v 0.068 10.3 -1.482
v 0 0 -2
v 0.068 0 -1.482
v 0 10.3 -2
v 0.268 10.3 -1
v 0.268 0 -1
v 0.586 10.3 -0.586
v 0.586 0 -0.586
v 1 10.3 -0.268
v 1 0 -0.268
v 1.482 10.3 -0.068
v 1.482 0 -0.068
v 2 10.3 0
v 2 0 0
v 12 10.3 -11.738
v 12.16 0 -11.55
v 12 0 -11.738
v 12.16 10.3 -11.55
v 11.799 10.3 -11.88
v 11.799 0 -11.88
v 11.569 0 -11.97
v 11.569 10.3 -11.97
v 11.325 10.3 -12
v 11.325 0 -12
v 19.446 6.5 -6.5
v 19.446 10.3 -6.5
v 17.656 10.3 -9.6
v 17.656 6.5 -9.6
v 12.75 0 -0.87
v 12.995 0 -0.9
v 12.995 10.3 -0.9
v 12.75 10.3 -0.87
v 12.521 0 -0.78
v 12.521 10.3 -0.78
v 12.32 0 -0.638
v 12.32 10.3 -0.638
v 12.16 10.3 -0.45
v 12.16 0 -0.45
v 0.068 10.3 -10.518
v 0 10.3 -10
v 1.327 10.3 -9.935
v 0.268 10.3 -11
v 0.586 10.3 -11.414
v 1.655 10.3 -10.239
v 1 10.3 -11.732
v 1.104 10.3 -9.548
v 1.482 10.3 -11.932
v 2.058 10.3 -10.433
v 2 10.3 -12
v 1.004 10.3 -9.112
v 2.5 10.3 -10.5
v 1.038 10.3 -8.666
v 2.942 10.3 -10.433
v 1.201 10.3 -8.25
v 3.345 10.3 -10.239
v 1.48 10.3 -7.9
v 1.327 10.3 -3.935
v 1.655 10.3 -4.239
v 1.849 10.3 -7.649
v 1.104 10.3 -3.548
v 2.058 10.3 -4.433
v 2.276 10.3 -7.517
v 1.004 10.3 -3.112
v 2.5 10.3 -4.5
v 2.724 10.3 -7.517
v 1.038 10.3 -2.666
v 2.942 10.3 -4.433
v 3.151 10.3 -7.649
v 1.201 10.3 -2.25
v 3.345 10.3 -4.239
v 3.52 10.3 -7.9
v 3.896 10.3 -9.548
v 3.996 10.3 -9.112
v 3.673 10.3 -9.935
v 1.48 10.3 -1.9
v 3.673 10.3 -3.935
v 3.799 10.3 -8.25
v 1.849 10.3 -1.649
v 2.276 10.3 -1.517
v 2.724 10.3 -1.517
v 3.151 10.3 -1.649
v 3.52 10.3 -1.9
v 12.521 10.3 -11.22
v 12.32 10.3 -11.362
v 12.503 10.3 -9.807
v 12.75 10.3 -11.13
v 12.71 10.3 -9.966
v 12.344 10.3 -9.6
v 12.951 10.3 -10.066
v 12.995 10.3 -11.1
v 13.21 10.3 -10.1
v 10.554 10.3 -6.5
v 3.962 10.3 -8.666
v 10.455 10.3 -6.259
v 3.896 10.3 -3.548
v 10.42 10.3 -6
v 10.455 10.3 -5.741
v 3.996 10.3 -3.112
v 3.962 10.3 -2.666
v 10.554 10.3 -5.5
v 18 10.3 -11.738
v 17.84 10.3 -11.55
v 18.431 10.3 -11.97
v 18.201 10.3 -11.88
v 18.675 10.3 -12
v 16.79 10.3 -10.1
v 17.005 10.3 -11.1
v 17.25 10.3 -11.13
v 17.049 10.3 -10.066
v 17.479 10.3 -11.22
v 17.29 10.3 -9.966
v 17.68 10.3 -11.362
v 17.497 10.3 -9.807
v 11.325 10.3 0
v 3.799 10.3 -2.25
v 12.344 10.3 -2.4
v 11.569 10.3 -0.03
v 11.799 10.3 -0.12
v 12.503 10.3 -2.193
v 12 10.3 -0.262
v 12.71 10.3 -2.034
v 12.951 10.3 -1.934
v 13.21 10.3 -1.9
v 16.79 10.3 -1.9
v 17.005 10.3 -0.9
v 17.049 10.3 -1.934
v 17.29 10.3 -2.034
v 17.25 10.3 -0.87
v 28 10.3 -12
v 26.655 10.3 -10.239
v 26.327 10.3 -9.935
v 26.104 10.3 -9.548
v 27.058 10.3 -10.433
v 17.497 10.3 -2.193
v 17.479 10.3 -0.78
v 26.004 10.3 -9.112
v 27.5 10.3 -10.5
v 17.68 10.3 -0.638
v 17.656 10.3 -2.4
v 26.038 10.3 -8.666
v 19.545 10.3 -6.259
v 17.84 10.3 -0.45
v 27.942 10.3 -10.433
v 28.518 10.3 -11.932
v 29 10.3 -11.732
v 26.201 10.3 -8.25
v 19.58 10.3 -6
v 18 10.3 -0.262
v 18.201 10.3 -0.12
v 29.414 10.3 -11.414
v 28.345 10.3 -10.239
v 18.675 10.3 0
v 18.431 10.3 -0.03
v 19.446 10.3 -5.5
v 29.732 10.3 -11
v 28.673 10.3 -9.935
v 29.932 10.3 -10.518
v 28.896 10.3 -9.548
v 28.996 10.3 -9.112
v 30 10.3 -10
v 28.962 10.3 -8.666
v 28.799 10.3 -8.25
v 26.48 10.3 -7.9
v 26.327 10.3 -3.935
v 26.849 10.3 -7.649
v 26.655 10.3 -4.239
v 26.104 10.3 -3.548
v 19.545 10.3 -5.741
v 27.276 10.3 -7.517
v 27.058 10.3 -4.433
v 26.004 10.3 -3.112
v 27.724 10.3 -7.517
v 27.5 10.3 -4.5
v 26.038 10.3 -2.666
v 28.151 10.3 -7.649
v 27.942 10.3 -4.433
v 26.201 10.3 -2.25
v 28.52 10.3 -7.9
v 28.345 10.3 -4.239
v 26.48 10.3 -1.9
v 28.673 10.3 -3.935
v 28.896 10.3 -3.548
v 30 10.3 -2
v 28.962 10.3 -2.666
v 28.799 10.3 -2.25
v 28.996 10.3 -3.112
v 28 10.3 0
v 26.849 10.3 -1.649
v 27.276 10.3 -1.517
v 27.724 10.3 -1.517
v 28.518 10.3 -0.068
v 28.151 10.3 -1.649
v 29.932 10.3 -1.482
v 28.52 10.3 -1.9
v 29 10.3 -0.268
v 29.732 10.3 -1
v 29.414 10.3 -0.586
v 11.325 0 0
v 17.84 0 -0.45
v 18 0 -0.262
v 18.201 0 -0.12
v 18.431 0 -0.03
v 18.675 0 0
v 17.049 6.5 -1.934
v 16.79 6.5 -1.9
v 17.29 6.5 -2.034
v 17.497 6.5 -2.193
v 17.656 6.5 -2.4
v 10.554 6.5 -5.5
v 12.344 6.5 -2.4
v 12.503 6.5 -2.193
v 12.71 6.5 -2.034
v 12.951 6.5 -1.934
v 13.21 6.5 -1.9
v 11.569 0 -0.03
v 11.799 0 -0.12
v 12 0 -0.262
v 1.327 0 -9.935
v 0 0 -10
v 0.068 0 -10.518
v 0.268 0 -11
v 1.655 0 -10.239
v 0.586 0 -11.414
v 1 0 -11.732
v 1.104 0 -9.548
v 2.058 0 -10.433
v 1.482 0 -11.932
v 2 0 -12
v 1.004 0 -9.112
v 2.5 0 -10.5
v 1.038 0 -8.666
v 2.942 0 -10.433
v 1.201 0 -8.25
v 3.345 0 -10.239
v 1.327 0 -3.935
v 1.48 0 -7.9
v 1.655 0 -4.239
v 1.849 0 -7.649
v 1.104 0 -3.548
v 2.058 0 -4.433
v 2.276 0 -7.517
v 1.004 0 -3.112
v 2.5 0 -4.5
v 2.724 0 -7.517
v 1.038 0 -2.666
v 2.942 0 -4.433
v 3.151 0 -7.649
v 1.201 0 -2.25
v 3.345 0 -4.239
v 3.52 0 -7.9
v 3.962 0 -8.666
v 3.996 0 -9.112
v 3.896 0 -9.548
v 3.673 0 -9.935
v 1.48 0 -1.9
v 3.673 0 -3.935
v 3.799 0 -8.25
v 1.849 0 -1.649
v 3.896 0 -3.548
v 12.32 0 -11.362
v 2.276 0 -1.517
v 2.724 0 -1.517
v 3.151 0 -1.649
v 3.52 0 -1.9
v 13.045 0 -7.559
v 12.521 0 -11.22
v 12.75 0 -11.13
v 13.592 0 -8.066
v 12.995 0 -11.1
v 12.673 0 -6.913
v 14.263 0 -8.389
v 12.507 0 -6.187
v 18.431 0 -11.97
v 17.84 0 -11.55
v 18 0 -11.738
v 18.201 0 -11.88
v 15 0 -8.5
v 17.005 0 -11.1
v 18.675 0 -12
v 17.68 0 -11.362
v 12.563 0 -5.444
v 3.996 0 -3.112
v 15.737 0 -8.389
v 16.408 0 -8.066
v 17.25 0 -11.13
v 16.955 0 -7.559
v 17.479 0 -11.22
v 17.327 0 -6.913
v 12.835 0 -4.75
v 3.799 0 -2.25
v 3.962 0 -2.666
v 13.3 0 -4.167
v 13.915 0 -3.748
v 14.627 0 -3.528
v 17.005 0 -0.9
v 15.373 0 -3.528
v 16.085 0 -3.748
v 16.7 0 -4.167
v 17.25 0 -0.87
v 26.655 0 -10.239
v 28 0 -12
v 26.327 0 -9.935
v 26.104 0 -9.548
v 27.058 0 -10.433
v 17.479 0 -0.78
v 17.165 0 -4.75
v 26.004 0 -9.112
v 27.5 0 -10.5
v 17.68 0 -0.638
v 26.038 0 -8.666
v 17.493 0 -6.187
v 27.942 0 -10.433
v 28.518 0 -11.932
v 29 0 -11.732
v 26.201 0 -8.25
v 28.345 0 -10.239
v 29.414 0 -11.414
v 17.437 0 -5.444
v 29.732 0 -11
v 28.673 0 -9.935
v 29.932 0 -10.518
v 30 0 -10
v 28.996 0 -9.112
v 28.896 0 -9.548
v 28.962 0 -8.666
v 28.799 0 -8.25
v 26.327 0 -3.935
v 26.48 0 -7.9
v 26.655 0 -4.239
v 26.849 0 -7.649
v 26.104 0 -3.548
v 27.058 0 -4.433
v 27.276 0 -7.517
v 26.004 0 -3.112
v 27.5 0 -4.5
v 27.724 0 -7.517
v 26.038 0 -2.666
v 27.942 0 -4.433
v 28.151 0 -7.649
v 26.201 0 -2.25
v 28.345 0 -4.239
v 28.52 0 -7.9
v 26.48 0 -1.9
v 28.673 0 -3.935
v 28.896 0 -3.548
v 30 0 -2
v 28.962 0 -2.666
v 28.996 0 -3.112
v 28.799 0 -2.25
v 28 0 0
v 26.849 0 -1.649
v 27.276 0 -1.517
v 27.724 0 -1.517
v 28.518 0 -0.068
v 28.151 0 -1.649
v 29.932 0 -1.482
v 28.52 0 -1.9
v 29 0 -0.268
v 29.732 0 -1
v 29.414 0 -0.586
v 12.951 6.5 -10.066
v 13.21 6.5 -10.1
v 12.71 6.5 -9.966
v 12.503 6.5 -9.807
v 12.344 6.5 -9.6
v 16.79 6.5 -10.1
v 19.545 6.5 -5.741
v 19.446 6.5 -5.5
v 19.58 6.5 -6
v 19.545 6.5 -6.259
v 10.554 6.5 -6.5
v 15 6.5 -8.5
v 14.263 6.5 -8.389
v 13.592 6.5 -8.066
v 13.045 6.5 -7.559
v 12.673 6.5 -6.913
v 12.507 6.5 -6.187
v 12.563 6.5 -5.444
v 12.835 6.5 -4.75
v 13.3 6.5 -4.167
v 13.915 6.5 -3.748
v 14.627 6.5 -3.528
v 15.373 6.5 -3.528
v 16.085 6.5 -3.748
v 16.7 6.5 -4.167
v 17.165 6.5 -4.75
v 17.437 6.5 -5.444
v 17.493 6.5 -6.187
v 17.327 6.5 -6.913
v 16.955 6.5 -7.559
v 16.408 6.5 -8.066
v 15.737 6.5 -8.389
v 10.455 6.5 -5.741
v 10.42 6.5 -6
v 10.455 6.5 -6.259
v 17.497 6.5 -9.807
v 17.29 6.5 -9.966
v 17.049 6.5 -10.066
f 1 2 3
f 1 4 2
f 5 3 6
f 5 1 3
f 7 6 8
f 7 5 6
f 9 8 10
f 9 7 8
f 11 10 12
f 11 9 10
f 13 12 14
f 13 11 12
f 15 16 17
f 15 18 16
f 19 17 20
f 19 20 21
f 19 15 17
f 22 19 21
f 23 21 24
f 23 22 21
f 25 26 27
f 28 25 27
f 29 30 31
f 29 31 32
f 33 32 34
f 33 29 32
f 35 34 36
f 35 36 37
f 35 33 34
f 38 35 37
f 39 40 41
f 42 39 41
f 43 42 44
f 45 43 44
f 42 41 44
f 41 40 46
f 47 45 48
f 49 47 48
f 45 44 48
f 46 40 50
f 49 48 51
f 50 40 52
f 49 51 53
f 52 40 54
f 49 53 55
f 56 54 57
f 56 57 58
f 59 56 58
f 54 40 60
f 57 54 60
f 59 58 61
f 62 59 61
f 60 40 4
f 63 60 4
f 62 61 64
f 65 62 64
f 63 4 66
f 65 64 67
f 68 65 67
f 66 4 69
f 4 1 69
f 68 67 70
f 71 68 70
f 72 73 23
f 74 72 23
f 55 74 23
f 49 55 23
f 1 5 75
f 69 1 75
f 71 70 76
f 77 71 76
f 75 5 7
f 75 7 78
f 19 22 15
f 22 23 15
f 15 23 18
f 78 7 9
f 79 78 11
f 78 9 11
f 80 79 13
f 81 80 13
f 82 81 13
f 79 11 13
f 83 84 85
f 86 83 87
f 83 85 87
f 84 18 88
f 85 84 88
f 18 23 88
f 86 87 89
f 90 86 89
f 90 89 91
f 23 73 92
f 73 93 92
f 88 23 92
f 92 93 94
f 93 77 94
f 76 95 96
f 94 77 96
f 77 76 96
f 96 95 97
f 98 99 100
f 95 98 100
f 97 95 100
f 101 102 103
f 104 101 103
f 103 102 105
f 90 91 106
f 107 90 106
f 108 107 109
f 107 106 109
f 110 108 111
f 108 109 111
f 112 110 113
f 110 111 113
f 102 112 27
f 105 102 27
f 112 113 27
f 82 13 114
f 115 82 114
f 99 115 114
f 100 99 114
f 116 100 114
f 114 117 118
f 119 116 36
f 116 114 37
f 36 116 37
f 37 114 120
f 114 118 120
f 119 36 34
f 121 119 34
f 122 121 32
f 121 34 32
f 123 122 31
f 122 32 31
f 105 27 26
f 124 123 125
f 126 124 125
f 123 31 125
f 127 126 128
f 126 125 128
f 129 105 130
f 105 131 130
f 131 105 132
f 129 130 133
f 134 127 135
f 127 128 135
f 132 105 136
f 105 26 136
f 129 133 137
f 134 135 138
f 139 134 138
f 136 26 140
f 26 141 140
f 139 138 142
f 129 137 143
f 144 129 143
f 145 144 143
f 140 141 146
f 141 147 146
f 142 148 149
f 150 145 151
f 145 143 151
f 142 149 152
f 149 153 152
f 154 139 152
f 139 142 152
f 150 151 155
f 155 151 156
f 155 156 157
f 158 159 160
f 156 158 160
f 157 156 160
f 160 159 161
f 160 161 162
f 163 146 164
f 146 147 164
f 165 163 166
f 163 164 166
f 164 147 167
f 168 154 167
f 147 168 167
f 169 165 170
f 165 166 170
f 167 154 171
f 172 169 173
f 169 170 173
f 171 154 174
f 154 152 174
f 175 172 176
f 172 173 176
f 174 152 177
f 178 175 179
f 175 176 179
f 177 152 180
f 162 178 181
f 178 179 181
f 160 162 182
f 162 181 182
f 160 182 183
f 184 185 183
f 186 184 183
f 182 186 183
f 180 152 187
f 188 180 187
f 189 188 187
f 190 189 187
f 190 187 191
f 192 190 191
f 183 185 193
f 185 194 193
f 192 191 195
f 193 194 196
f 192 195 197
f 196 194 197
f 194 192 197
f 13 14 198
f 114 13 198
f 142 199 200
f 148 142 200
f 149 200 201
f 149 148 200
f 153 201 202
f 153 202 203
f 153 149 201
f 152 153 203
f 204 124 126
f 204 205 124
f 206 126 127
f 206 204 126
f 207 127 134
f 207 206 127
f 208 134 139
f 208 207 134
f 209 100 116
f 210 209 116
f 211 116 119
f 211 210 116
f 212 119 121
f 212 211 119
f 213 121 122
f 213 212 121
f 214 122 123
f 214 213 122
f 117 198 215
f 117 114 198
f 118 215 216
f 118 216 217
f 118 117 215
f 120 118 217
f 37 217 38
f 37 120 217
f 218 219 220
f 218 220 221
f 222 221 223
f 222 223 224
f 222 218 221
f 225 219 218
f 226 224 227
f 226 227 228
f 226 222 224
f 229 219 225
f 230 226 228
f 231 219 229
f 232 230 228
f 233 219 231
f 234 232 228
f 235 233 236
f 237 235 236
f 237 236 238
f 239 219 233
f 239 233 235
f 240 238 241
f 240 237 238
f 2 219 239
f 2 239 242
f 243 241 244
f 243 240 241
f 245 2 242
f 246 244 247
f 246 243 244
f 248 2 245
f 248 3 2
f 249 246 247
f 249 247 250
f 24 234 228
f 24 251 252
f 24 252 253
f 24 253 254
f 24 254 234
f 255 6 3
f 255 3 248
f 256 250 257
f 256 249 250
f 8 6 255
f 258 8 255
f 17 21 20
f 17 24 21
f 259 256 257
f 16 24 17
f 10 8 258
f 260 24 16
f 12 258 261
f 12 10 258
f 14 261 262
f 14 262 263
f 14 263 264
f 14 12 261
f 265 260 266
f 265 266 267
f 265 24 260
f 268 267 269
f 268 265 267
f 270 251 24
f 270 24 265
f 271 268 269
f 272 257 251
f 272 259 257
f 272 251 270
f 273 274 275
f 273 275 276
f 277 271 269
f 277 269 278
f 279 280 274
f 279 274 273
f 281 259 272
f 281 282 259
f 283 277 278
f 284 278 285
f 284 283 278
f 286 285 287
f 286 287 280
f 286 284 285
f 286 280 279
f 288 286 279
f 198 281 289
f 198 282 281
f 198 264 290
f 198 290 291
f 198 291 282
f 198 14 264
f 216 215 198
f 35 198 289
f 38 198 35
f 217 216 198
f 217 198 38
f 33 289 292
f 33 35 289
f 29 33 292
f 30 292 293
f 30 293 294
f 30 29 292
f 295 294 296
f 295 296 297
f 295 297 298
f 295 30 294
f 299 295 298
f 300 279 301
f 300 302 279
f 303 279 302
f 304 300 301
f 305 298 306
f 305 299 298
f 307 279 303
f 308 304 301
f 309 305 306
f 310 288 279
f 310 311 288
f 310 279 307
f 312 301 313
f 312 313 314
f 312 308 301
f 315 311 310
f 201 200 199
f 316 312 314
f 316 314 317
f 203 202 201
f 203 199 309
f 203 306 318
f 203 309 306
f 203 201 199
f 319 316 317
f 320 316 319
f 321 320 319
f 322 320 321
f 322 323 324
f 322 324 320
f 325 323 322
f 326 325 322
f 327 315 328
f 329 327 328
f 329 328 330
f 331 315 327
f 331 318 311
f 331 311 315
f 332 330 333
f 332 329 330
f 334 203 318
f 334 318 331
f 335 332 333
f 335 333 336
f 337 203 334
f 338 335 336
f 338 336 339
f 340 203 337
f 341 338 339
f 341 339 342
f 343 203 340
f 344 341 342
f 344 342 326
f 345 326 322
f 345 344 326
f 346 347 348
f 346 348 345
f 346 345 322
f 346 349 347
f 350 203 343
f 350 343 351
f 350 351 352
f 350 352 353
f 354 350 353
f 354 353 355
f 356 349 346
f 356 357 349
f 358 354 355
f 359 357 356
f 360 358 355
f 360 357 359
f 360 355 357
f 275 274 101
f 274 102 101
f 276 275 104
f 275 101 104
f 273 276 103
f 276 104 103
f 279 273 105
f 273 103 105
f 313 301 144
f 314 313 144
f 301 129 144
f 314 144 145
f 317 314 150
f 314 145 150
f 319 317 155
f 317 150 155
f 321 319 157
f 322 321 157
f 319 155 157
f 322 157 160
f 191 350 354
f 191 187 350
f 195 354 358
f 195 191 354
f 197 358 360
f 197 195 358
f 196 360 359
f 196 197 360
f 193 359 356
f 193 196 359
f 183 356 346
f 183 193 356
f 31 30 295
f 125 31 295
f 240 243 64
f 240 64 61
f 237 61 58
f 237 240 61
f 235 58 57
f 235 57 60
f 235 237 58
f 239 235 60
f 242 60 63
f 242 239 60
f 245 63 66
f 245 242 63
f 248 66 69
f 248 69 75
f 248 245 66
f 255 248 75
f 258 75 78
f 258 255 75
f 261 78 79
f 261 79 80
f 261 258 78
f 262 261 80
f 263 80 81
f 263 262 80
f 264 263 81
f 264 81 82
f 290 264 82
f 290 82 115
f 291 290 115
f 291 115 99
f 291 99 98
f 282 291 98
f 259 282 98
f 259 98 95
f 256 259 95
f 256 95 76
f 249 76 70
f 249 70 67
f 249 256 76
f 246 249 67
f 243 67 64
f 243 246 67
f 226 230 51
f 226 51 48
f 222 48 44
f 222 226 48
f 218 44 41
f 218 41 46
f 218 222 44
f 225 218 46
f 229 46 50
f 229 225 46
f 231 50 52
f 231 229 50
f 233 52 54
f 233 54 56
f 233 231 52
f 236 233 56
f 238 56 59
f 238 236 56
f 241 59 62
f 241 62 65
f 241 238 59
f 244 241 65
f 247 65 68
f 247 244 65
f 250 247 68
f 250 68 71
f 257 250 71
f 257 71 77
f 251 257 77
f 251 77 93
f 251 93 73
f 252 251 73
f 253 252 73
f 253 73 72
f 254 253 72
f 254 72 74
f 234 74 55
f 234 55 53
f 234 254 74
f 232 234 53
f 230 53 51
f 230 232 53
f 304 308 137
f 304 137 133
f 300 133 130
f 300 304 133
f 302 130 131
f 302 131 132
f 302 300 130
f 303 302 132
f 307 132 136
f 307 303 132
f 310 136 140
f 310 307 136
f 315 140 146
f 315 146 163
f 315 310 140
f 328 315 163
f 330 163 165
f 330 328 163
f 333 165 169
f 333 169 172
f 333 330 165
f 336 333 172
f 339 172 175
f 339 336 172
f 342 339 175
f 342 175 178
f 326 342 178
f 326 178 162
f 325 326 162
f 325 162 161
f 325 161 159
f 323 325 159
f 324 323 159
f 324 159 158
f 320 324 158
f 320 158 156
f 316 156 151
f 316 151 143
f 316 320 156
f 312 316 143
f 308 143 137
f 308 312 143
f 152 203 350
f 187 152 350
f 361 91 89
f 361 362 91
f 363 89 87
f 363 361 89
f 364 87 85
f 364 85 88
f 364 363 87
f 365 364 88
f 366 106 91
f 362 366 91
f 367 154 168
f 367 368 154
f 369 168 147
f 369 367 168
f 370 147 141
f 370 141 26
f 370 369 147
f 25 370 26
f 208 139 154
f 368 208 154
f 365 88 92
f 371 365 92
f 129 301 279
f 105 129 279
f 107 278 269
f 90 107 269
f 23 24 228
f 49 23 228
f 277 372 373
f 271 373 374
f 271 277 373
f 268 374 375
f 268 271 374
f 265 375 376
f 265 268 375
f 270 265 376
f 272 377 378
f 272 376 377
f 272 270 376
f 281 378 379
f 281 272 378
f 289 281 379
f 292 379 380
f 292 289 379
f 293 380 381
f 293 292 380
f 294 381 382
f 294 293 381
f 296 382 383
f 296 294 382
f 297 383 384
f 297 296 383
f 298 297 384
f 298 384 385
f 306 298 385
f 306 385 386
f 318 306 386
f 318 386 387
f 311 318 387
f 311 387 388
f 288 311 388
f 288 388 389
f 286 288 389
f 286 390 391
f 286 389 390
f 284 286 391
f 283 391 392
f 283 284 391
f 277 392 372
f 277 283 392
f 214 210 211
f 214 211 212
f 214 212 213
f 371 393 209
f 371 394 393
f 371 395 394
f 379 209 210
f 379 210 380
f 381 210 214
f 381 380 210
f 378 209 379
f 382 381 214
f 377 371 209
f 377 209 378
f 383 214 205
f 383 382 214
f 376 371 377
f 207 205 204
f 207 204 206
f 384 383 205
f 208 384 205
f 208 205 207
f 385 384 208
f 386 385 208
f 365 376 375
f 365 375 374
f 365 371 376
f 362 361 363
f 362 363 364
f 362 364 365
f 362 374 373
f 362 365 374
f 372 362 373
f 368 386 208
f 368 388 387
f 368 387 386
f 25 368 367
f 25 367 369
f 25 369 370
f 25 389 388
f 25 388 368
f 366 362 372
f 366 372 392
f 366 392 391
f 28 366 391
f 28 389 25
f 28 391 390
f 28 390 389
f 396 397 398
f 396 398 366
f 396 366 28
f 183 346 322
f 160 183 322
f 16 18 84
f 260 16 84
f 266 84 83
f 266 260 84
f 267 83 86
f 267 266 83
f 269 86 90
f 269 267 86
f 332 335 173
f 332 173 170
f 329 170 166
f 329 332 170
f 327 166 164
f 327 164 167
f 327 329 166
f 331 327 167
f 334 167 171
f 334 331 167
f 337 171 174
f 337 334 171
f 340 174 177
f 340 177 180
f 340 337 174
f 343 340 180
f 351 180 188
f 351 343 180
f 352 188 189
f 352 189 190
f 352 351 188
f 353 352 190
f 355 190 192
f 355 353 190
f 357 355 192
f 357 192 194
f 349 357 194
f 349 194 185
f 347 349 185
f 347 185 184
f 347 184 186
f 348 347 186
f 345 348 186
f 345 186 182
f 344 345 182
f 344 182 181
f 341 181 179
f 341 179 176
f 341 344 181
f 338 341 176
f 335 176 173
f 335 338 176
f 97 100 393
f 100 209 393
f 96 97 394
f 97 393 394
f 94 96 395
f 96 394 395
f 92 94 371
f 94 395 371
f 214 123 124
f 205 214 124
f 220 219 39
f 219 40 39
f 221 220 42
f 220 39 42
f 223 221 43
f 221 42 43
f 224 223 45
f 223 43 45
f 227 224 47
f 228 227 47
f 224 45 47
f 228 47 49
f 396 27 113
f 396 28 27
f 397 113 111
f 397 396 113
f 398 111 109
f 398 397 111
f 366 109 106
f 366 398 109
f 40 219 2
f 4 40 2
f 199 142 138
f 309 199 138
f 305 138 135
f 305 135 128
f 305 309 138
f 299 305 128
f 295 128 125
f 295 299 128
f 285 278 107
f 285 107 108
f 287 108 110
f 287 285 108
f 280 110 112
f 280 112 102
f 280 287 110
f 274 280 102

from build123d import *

# Parameters (mm, degrees)
SKETCH_1_R          = 1.5
SKETCH_1_R_2        = 2.5
EXTRUDE_1_DEPTH     = 10.3
CUT_EXTRUDE_1_DEPTH = 3.8
FILLET_1_R          = 2
FILLET_2_R          = 1
FILLET_3_R          = 1
FILLET_4_R          = 1


with BuildPart() as part:
    # 草图1 → 凸台-拉伸1 (new body)
    with BuildSketch(Plane(origin=(0, 0, 0), x_dir=(1, 0, 0), z_dir=(0, 1, 0))):
        Polygon((0, 12), (0, 0), (12, 0), (12, 0.9), (18, 0.9), (18, 0), (30, 0), (30, 12), (18, 12), (18, 11.1), (12, 11.1), (12, 12), align=None)
        with Locations(Location((2.5, 3, 0), (0, 0, 90))):
            Circle(SKETCH_1_R, mode=Mode.SUBTRACT)
        with Locations(Location((15, 6, 0), (0, 0, 90))):
            Circle(SKETCH_1_R_2, mode=Mode.SUBTRACT)
        with Locations(Location((27.5, 3, 0), (0, 0, 90))):
            Circle(SKETCH_1_R, mode=Mode.SUBTRACT)
        with Locations(Location((2.5, 9, 0), (0, 0, 90))):
            Circle(SKETCH_1_R, mode=Mode.SUBTRACT)
        with Locations(Location((27.5, 9, 0), (0, 0, 90))):
            Circle(SKETCH_1_R, mode=Mode.SUBTRACT)
    extrude(amount=EXTRUDE_1_DEPTH)

    # 草图2 → 切除-拉伸1 (cut)
    with BuildSketch(Plane(origin=(0, 10.3, 0), x_dir=(1, 0, 0), z_dir=(0, 1, 0))):
        Polygon((10.265727793, 6), (12.632863896, 1.9), (17.367136104, 1.9), (19.734272207, 6), (17.367136104, 10.1), (12.632863896, 10.1), align=None)
    extrude(amount=-CUT_EXTRUDE_1_DEPTH, mode=Mode.SUBTRACT)

    # 圆角1
    fillet_1_edges = [part.edges().sort_by_distance(p)[0] for p in [
        (30, 5.15, -12),
        (30, 5.15, 0),
        (0, 5.15, 0),
        (0, 5.15, -12),
    ]]
    fillet(fillet_1_edges, radius=FILLET_1_R)

    # 圆角2
    fillet_2_edges = [part.edges().sort_by_distance(p)[0] for p in [
        (10.265727793, 8.4, -6),
        (12.632863896, 8.4, -10.1),
        (17.367136104, 8.4, -10.1),
        (19.734272207, 8.4, -6),
        (17.367136104, 8.4, -1.9),
        (12.632863896, 8.4, -1.9),
    ]]
    fillet(fillet_2_edges, radius=FILLET_2_R)

    # 圆角3
    # the kernel refuses this fillet: 1 mm, written as the material it adds along each edge
    with BuildSketch(Plane(origin=(12, 0, -0.9), x_dir=(0, 0, 1), z_dir=(0, 1, 0))) as fillet_3_piece_1:
        with BuildLine():
            CenterArc((1, 0.994987437), FILLET_3_R, 180, 84.260829523)
            Line((0, 0.994987437), (-0.02, 0.994987437))
            Line((-0.02, 0.994987437), (-0.02, 0))
            Line((-0.02, 0), (0, -0.02))
            ThreePointArc((0, -0.02), (0.45, -0.02), (0.898, -0.019899749))
            Line((0.898, -0.019899749), (0.9, 0))
        make_face()
    extrude(amount=10.3)
    with BuildSketch(Plane(origin=(18, 0, -0.9), x_dir=(-1, 0, 0), z_dir=(0, 1, 0))) as fillet_3_piece_2:
        with BuildLine():
            CenterArc((0.994987437, 1), FILLET_3_R, 185.739170477, 84.260829523)
            Line((0, 0.9), (-0.019899749, 0.898))
            ThreePointArc((-0.019899749, 0.898), (-0.02, 0.45), (-0.02, 0))
            Line((-0.02, 0), (0, -0.02))
            Line((0, -0.02), (0.994987437, -0.02))
            Line((0.994987437, -0.02), (0.994987437, 0))
        make_face()
    extrude(amount=10.3)
    with BuildSketch(Plane(origin=(12, 0, -11.1), x_dir=(0, 0, -1), z_dir=(0, 1, 0))) as fillet_3_piece_3:
        with BuildLine():
            CenterArc((1, -0.994987437), FILLET_3_R, 95.739170477, 84.260829523)
            Line((0, -0.994987437), (-0.02, -0.994987437))
            Line((-0.02, -0.994987437), (-0.02, 0))
            Line((-0.02, 0), (0, 0.02))
            ThreePointArc((0, 0.02), (0.45, 0.02), (0.898, 0.019899749))
            Line((0.898, 0.019899749), (0.9, 0))
        make_face()
    extrude(amount=10.3)
    with BuildSketch(Plane(origin=(18, 0, -11.1), x_dir=(-1, 0, 0), z_dir=(0, 1, 0))) as fillet_3_piece_4:
        with BuildLine():
            CenterArc((0.994987437, -1), FILLET_3_R, 90, 84.260829523)
            Line((0, -0.9), (-0.019899749, -0.898))
            ThreePointArc((-0.019899749, -0.898), (-0.02, -0.45), (-0.02, 0))
            Line((-0.02, 0), (0, 0.02))
            Line((0, 0.02), (0.994987437, 0.02))
            Line((0.994987437, 0.02), (0.994987437, 0))
        make_face()
    extrude(amount=10.3)

    # 圆角4
    fillet_4_edges = [part.edges().sort_by_distance(p)[0] for p in [
        (18, 5.15, 0),
        (12, 5.15, 0),
        (12, 5.15, -12),
        (18, 5.15, -12),
    ]]
    fillet(fillet_4_edges, radius=FILLET_4_R)


solid = part.part
